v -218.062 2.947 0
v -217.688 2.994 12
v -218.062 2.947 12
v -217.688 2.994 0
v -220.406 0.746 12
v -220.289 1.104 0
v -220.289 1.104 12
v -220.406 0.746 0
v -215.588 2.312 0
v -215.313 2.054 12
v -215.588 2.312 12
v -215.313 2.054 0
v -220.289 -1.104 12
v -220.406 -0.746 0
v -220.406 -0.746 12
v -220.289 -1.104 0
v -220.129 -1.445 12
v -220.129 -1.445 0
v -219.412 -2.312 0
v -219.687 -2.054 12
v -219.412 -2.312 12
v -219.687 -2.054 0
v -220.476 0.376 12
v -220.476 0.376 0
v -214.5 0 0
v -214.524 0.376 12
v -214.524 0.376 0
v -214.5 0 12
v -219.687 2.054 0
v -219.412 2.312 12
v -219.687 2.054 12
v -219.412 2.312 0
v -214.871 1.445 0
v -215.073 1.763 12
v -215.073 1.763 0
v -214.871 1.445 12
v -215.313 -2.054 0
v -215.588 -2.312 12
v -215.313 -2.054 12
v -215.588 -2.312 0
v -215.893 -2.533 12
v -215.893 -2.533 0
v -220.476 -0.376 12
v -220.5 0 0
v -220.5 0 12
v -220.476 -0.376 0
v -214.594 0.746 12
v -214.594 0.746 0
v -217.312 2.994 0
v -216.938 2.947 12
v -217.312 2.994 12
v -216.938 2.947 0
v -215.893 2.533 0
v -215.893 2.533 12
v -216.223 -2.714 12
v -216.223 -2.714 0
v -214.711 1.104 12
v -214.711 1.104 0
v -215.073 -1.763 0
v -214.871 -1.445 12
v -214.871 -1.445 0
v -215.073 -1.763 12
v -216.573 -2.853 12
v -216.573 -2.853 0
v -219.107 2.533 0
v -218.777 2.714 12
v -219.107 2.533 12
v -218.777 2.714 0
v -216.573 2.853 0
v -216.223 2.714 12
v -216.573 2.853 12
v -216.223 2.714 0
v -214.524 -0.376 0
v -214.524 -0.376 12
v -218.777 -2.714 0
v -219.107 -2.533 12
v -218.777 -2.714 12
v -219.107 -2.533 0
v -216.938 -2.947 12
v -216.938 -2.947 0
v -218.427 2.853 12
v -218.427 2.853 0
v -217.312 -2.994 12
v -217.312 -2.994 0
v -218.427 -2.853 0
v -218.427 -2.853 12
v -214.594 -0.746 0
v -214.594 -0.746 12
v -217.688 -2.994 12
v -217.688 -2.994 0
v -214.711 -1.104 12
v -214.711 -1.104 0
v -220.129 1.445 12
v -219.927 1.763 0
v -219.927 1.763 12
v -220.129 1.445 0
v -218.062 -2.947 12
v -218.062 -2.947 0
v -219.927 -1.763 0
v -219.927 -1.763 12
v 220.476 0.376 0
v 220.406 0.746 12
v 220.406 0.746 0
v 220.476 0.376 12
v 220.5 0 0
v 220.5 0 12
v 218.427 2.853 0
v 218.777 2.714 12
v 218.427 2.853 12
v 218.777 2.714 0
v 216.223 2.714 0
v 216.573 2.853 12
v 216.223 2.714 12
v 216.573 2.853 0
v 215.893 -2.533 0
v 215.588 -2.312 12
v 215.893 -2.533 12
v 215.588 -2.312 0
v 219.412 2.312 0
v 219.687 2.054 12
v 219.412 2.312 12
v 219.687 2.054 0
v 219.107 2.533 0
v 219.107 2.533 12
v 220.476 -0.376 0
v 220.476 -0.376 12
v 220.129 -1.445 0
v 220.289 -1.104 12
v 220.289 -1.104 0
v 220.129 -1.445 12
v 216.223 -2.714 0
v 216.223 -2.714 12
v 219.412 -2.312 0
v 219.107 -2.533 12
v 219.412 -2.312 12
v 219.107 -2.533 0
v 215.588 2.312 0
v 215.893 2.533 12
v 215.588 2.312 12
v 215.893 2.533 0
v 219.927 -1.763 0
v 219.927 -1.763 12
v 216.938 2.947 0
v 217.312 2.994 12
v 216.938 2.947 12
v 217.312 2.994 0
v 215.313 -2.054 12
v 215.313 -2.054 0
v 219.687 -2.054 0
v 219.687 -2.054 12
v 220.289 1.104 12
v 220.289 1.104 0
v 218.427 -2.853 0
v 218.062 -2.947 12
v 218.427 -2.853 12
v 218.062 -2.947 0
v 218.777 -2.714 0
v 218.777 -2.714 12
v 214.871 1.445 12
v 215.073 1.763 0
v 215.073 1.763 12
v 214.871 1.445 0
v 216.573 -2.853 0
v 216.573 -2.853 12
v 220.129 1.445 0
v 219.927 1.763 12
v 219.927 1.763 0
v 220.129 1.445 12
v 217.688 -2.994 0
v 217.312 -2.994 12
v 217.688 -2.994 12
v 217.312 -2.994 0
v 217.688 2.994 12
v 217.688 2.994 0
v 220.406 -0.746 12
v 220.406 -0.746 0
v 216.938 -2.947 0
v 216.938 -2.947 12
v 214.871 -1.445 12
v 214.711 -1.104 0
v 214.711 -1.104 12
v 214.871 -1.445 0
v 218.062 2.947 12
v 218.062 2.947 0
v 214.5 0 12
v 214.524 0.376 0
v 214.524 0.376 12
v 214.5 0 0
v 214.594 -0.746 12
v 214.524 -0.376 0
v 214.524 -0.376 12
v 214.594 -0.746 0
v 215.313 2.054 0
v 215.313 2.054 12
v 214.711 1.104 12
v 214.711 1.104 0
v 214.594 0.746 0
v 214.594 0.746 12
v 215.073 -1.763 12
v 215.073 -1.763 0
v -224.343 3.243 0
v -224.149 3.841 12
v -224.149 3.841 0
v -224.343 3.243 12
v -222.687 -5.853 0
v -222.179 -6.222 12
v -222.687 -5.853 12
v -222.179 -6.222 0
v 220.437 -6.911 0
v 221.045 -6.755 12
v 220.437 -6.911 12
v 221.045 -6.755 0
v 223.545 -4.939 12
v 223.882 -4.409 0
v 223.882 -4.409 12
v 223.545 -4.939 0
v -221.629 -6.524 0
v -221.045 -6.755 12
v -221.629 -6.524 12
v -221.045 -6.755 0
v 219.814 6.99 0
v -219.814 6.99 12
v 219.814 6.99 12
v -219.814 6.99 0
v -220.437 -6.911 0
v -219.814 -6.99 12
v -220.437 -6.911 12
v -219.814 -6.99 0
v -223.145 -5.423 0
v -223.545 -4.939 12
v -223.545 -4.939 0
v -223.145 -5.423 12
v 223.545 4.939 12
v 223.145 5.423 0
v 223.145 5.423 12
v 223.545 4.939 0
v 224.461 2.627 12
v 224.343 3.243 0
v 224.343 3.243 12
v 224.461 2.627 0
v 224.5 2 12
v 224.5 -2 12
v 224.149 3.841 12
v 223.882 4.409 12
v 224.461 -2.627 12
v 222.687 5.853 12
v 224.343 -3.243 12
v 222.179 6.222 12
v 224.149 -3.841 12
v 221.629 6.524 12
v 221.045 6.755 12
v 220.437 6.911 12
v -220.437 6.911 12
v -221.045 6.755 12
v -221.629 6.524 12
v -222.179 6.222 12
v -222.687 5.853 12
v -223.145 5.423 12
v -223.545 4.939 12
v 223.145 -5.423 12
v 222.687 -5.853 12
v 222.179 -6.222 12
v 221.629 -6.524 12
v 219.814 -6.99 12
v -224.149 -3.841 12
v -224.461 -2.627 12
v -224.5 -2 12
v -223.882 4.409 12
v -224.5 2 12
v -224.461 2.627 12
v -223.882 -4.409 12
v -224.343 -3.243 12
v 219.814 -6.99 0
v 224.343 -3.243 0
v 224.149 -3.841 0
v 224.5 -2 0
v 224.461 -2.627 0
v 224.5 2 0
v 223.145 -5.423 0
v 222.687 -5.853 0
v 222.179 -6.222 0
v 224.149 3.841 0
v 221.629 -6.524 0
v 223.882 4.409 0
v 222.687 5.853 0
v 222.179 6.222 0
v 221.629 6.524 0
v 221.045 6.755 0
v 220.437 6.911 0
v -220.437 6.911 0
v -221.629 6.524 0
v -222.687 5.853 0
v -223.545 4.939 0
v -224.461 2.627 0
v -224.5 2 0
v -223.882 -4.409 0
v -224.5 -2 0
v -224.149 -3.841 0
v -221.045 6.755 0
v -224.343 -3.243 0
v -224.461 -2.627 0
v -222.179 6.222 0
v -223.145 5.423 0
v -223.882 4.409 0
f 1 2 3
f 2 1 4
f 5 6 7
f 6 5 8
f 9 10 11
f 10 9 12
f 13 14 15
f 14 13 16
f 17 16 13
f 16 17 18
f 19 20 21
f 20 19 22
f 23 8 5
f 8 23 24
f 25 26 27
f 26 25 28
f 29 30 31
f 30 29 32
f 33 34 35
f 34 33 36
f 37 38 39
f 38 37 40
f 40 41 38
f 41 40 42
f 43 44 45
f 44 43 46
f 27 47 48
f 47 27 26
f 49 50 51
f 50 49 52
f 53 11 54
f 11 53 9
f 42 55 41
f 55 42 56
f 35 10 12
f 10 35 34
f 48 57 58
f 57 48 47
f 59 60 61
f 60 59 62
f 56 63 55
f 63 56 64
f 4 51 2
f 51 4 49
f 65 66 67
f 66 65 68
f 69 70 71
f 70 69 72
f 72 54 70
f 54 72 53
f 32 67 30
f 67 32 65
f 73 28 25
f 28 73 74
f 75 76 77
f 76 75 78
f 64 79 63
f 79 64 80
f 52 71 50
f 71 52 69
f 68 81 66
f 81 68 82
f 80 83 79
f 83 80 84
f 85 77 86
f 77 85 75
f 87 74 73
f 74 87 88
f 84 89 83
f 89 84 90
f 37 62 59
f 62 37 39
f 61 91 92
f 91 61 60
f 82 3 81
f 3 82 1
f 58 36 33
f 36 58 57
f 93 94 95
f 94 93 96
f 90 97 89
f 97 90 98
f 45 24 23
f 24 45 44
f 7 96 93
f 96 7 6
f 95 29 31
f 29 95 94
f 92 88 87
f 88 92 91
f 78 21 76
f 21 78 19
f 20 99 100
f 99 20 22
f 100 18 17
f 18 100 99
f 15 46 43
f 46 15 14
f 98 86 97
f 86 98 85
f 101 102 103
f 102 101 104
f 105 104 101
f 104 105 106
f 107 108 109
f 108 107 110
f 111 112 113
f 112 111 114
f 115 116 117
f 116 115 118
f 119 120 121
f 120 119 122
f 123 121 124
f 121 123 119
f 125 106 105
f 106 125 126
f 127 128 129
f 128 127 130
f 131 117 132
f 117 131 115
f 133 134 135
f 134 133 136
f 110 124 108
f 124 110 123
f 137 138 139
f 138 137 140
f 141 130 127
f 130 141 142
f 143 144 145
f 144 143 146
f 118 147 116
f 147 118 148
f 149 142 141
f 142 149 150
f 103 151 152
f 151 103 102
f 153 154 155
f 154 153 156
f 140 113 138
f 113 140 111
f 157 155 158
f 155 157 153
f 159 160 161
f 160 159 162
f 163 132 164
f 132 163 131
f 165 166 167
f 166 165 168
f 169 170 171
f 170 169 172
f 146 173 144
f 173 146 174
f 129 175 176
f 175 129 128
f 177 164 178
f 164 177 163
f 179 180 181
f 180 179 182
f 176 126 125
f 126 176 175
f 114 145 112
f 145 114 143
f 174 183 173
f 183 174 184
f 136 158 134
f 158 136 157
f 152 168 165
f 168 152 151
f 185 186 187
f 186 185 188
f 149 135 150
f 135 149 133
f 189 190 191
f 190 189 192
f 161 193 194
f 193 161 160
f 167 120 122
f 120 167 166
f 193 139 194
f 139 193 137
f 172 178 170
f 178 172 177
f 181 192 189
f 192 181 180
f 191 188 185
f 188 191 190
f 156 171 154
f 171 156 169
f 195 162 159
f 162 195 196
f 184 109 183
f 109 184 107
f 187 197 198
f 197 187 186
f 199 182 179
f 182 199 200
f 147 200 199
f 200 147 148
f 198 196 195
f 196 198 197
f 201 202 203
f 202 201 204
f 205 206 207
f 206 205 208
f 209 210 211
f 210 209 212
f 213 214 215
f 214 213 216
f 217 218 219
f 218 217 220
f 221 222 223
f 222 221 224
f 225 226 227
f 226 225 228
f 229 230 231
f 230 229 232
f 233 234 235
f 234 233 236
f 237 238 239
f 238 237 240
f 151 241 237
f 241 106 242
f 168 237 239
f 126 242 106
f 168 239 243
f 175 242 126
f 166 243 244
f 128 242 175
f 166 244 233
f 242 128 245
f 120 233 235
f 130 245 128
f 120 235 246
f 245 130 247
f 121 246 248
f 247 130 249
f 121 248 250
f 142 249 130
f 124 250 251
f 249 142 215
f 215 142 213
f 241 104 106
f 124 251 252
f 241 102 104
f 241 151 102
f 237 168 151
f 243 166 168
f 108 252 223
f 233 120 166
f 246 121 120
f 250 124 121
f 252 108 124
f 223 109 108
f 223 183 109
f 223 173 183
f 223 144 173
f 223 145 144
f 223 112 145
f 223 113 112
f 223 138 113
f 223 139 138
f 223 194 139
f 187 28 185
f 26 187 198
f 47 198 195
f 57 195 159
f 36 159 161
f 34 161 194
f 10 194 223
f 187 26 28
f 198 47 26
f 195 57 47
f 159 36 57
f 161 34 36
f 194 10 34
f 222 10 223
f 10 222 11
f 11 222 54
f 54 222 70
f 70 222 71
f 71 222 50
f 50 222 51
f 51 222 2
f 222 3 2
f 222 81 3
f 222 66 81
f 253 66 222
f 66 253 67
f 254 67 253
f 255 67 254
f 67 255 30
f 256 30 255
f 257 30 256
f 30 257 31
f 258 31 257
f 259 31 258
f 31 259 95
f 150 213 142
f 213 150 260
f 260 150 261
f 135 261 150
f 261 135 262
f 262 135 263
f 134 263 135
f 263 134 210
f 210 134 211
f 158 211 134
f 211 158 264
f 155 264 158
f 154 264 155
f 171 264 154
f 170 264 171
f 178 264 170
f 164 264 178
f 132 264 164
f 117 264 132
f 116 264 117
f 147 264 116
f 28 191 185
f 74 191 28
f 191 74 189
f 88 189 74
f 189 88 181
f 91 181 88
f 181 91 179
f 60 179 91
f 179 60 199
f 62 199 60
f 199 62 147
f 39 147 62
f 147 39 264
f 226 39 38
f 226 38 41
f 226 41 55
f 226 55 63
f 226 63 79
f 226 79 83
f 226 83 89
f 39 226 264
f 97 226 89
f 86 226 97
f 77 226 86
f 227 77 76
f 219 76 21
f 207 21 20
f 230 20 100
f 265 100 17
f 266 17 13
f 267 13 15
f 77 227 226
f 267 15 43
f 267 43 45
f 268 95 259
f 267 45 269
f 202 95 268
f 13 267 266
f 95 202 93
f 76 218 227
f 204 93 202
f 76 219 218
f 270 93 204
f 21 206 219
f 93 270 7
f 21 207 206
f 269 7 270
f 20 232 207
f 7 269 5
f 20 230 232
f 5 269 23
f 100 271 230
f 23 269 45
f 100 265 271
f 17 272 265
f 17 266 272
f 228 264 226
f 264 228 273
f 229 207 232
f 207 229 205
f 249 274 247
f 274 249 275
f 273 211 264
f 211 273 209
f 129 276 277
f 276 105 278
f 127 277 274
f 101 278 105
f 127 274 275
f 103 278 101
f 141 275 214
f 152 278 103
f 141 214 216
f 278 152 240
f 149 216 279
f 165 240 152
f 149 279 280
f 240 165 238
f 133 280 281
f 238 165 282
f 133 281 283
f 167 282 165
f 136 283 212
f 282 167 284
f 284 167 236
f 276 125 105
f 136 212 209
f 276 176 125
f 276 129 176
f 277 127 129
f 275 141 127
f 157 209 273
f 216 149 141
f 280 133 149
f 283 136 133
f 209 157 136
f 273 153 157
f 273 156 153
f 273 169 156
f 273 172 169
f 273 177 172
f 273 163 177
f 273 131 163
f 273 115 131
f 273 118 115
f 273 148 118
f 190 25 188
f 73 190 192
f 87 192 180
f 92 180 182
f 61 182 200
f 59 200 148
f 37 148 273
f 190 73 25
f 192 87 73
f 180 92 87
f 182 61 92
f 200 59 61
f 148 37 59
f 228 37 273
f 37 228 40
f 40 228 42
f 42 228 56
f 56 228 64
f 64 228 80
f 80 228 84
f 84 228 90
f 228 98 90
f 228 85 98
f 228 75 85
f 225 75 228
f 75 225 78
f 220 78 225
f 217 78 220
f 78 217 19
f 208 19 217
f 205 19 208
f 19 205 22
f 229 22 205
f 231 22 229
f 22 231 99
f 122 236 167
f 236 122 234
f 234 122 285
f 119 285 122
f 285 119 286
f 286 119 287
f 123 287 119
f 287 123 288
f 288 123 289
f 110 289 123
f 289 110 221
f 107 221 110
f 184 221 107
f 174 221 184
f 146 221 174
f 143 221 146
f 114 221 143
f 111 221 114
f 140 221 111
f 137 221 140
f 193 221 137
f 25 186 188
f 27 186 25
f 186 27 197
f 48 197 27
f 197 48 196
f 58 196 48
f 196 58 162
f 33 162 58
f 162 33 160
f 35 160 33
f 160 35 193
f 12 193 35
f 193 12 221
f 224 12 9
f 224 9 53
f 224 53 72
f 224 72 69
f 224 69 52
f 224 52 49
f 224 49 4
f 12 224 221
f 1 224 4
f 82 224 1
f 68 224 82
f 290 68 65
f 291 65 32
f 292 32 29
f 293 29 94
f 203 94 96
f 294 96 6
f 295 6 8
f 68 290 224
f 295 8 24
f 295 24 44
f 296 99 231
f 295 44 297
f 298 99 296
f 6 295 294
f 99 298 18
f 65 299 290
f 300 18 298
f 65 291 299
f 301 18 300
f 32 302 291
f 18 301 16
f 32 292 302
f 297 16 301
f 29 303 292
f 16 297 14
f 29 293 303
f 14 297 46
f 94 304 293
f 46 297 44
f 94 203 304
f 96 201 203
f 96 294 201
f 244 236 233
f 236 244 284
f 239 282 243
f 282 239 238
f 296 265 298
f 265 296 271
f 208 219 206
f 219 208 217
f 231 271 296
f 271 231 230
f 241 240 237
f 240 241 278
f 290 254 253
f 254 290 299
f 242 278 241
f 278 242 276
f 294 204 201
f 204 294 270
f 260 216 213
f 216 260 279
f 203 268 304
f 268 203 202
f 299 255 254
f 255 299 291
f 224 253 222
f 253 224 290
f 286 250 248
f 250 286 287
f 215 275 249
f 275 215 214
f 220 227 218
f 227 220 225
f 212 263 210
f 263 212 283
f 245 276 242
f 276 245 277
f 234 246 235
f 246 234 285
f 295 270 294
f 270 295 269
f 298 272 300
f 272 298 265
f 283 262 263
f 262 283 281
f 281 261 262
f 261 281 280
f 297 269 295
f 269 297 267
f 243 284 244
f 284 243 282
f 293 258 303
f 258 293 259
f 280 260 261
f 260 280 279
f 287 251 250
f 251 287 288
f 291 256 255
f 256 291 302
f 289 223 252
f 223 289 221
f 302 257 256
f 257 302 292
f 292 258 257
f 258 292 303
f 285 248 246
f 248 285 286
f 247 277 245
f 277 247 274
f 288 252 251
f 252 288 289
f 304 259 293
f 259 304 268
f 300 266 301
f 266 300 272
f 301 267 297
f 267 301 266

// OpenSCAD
$fn = 50;


difference() {
	union() {
		hull() {
			translate(v = [-219.5000000000, 2.0000000000, 0]) {
				cylinder(h = 12, r = 5);
			}
			translate(v = [219.5000000000, 2.0000000000, 0]) {
				cylinder(h = 12, r = 5);
			}
			translate(v = [-219.5000000000, -2.0000000000, 0]) {
				cylinder(h = 12, r = 5);
			}
			translate(v = [219.5000000000, -2.0000000000, 0]) {
				cylinder(h = 12, r = 5);
			}
		}
	}
	union() {
		translate(v = [-217.5000000000, 0.0000000000, -100.0000000000]) {
			cylinder(h = 200, r = 3.0000000000);
		}
		translate(v = [-217.5000000000, 0.0000000000, -100.0000000000]) {
			cylinder(h = 200, r = 3.0000000000);
		}
		translate(v = [217.5000000000, 0.0000000000, -100.0000000000]) {
			cylinder(h = 200, r = 3.0000000000);
		}
		translate(v = [217.5000000000, 0.0000000000, -100.0000000000]) {
			cylinder(h = 200, r = 3.0000000000);
		}
	}
}
